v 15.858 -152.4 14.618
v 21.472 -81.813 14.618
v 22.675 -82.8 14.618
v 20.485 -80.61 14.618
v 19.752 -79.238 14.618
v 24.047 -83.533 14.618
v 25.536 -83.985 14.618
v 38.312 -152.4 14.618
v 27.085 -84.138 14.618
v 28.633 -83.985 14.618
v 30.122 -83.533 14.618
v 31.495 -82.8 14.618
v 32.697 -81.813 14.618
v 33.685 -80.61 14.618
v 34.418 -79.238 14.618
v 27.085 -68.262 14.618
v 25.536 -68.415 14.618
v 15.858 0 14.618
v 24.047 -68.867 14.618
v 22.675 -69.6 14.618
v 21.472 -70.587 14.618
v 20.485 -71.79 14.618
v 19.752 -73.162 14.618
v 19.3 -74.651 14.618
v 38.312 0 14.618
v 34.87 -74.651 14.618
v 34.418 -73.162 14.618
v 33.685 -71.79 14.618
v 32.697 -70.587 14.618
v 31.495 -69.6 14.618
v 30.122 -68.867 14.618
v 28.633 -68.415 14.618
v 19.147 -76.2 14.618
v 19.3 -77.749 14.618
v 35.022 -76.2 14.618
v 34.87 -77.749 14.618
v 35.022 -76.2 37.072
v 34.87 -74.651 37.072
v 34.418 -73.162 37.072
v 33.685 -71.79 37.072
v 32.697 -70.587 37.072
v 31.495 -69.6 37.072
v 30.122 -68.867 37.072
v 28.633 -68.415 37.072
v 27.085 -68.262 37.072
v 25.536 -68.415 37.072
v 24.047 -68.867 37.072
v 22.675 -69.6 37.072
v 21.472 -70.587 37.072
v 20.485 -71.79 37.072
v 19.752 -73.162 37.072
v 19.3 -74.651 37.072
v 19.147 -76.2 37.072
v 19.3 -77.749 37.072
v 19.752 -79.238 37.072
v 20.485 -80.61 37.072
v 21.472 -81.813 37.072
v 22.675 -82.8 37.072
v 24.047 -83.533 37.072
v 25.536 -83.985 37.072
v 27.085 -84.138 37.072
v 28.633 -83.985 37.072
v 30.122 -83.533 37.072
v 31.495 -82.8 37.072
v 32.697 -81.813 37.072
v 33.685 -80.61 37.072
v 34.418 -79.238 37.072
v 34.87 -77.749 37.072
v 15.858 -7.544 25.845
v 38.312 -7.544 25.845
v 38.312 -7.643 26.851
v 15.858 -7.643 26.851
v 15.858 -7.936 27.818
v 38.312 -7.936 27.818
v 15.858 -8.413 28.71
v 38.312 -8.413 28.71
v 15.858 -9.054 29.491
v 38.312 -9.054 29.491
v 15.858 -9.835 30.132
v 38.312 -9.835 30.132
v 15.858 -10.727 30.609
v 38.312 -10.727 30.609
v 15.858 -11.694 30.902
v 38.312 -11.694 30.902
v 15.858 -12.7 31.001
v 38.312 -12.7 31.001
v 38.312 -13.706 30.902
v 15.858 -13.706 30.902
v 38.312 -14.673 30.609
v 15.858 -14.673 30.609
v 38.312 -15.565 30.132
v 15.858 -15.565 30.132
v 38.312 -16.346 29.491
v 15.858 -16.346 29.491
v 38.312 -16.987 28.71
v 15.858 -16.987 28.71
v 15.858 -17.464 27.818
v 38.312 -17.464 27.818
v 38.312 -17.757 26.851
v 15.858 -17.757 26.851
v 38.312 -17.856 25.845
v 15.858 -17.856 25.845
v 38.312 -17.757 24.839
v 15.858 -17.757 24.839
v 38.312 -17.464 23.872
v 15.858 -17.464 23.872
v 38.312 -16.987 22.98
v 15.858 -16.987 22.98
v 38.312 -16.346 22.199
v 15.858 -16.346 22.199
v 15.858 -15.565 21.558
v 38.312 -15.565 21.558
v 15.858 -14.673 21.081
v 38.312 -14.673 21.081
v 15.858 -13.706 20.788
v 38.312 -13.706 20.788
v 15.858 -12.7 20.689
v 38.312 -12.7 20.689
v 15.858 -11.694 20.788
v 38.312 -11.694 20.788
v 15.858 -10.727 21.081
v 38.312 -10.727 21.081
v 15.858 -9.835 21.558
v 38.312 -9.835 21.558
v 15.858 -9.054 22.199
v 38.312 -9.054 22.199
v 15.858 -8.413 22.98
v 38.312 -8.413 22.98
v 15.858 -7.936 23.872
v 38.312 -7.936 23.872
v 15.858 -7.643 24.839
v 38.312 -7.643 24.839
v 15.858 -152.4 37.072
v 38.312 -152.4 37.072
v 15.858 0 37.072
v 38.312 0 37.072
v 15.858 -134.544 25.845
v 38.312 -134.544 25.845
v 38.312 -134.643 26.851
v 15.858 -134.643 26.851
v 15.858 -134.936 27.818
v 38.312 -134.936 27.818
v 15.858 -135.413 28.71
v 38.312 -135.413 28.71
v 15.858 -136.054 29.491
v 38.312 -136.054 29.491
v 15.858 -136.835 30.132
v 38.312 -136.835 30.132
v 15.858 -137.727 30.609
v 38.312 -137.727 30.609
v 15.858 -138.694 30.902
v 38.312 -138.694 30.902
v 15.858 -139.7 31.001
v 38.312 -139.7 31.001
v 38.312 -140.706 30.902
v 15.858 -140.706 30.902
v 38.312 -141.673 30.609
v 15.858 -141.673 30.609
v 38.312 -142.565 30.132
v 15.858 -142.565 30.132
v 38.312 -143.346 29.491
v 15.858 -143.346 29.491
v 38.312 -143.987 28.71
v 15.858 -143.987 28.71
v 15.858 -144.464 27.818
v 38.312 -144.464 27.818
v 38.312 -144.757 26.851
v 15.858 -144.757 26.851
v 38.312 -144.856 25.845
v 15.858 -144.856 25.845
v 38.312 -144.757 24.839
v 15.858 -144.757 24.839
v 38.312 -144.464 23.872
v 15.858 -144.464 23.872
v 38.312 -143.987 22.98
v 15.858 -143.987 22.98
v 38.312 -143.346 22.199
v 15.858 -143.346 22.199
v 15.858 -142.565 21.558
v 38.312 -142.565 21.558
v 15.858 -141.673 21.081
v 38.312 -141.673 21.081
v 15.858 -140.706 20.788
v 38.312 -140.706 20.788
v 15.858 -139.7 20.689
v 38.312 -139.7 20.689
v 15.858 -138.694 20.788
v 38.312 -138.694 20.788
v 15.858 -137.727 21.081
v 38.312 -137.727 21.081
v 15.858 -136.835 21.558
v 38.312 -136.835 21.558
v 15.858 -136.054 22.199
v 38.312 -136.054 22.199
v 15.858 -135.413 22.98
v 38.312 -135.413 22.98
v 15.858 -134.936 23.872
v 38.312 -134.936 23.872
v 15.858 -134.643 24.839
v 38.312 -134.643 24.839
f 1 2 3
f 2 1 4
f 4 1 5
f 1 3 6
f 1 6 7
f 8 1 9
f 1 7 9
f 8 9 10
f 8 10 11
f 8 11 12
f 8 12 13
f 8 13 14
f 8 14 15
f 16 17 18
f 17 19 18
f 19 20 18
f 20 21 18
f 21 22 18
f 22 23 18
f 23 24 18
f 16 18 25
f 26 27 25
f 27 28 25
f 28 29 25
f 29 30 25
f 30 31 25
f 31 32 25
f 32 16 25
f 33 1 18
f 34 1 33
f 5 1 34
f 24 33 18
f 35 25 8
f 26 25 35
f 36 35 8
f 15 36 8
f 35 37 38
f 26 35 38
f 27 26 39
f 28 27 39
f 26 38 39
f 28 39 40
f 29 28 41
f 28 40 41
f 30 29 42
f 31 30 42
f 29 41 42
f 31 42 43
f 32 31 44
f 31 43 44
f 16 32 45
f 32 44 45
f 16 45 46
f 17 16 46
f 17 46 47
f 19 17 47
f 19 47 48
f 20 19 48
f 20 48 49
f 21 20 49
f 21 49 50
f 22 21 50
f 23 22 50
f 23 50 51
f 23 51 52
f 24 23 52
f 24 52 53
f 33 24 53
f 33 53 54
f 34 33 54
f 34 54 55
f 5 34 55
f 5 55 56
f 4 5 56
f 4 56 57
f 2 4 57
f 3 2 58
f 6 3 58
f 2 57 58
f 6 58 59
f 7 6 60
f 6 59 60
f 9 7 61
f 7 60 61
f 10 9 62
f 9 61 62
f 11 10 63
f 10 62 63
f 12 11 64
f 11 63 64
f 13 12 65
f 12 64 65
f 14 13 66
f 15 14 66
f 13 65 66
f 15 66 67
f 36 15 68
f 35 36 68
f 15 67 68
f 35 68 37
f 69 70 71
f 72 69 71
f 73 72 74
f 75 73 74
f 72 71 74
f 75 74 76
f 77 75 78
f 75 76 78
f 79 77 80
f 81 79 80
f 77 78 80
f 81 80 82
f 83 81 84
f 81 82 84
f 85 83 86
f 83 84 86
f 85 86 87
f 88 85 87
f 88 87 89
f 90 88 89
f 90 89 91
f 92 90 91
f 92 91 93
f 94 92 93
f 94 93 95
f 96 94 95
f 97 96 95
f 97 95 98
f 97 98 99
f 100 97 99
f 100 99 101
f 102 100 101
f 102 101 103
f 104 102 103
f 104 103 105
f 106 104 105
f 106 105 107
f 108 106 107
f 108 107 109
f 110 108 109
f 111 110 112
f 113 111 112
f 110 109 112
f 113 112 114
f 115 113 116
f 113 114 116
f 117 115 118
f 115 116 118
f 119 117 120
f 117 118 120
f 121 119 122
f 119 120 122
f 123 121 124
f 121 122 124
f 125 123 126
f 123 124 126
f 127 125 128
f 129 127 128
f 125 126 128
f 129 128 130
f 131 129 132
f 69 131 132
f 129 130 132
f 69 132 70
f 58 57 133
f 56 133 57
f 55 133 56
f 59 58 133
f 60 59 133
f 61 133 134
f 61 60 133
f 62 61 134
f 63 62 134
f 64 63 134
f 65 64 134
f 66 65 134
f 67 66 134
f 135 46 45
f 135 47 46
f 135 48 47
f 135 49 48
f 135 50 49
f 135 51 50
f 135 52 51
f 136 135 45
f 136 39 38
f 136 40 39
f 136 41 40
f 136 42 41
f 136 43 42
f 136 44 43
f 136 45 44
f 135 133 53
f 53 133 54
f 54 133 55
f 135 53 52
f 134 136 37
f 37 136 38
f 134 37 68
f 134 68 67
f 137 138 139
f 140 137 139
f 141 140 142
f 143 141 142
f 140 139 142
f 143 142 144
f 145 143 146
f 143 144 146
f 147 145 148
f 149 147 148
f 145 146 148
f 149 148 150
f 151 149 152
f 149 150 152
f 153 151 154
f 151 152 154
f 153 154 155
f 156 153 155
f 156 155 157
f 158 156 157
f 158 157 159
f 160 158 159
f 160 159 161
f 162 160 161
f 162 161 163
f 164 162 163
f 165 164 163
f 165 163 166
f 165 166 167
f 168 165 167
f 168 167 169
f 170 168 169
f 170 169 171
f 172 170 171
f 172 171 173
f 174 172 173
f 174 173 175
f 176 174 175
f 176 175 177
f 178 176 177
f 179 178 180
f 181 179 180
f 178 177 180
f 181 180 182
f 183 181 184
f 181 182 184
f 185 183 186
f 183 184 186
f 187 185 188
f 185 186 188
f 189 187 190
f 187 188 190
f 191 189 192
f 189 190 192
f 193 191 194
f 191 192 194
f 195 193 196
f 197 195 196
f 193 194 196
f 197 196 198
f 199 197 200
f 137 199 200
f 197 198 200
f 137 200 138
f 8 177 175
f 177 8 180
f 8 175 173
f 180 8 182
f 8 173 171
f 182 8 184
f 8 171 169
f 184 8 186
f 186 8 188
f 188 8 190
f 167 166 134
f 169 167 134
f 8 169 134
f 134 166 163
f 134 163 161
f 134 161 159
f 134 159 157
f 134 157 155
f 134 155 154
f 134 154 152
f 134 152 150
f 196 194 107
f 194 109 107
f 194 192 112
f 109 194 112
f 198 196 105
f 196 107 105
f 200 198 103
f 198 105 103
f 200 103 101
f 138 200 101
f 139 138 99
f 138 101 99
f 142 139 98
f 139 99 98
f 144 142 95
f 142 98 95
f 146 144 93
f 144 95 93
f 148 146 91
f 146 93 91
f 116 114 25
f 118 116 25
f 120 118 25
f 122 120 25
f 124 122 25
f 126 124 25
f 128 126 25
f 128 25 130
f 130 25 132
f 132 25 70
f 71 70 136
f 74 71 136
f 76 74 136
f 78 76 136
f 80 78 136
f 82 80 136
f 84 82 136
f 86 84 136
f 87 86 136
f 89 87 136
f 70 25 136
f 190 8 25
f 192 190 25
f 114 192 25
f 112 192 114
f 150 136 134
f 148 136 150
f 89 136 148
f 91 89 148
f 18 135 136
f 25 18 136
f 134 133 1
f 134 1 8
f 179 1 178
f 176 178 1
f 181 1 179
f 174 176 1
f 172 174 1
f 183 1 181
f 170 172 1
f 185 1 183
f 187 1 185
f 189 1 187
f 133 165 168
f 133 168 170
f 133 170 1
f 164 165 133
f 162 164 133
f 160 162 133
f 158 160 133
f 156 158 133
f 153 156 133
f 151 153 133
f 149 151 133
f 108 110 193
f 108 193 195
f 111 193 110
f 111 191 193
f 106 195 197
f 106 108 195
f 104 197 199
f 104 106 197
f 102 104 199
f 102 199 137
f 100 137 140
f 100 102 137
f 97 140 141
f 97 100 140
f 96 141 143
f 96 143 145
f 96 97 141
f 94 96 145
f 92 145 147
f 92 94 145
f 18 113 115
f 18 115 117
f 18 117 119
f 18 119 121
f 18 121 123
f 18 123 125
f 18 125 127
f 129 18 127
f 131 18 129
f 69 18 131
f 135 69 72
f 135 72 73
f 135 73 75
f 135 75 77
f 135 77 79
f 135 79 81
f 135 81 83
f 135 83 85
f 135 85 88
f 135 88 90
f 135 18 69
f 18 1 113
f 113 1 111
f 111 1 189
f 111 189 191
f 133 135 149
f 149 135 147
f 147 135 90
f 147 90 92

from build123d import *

# Parameters (mm, degrees)
F0_W     = 22.4536
F0_H     = 22.4536
F1_DEPTH = 152.4
F2_R     = 7.9375
F3_DEPTH = 22.4546
F4_R     = 5.1562
F5_DEPTH = 22.4546


with BuildPart() as f1:
    # F0 (on Front) → F1 (new body)
    with BuildSketch(Plane.XZ):
        with Locations((27.084826, 25.844949)):
            Rectangle(F0_W, F0_H)
    extrude(amount=F1_DEPTH)

    # F2 (on face) → F3 (cut, through all)
    with BuildSketch(Plane.XY.offset(37.071749)):
        with Locations((27.084826, -76.2)):
            Circle(F2_R)
    extrude(amount=-F3_DEPTH, mode=Mode.SUBTRACT)

    # F4 (on face) → F5 (cut, through all)
    with BuildSketch(Plane.YZ.offset(38.311626)):
        with Locations((-139.7, 25.844949)):
            Circle(F4_R)
        with Locations((-12.7, 25.844949)):
            Circle(F4_R)
    extrude(amount=-F5_DEPTH, mode=Mode.SUBTRACT)


solid = f1.part
